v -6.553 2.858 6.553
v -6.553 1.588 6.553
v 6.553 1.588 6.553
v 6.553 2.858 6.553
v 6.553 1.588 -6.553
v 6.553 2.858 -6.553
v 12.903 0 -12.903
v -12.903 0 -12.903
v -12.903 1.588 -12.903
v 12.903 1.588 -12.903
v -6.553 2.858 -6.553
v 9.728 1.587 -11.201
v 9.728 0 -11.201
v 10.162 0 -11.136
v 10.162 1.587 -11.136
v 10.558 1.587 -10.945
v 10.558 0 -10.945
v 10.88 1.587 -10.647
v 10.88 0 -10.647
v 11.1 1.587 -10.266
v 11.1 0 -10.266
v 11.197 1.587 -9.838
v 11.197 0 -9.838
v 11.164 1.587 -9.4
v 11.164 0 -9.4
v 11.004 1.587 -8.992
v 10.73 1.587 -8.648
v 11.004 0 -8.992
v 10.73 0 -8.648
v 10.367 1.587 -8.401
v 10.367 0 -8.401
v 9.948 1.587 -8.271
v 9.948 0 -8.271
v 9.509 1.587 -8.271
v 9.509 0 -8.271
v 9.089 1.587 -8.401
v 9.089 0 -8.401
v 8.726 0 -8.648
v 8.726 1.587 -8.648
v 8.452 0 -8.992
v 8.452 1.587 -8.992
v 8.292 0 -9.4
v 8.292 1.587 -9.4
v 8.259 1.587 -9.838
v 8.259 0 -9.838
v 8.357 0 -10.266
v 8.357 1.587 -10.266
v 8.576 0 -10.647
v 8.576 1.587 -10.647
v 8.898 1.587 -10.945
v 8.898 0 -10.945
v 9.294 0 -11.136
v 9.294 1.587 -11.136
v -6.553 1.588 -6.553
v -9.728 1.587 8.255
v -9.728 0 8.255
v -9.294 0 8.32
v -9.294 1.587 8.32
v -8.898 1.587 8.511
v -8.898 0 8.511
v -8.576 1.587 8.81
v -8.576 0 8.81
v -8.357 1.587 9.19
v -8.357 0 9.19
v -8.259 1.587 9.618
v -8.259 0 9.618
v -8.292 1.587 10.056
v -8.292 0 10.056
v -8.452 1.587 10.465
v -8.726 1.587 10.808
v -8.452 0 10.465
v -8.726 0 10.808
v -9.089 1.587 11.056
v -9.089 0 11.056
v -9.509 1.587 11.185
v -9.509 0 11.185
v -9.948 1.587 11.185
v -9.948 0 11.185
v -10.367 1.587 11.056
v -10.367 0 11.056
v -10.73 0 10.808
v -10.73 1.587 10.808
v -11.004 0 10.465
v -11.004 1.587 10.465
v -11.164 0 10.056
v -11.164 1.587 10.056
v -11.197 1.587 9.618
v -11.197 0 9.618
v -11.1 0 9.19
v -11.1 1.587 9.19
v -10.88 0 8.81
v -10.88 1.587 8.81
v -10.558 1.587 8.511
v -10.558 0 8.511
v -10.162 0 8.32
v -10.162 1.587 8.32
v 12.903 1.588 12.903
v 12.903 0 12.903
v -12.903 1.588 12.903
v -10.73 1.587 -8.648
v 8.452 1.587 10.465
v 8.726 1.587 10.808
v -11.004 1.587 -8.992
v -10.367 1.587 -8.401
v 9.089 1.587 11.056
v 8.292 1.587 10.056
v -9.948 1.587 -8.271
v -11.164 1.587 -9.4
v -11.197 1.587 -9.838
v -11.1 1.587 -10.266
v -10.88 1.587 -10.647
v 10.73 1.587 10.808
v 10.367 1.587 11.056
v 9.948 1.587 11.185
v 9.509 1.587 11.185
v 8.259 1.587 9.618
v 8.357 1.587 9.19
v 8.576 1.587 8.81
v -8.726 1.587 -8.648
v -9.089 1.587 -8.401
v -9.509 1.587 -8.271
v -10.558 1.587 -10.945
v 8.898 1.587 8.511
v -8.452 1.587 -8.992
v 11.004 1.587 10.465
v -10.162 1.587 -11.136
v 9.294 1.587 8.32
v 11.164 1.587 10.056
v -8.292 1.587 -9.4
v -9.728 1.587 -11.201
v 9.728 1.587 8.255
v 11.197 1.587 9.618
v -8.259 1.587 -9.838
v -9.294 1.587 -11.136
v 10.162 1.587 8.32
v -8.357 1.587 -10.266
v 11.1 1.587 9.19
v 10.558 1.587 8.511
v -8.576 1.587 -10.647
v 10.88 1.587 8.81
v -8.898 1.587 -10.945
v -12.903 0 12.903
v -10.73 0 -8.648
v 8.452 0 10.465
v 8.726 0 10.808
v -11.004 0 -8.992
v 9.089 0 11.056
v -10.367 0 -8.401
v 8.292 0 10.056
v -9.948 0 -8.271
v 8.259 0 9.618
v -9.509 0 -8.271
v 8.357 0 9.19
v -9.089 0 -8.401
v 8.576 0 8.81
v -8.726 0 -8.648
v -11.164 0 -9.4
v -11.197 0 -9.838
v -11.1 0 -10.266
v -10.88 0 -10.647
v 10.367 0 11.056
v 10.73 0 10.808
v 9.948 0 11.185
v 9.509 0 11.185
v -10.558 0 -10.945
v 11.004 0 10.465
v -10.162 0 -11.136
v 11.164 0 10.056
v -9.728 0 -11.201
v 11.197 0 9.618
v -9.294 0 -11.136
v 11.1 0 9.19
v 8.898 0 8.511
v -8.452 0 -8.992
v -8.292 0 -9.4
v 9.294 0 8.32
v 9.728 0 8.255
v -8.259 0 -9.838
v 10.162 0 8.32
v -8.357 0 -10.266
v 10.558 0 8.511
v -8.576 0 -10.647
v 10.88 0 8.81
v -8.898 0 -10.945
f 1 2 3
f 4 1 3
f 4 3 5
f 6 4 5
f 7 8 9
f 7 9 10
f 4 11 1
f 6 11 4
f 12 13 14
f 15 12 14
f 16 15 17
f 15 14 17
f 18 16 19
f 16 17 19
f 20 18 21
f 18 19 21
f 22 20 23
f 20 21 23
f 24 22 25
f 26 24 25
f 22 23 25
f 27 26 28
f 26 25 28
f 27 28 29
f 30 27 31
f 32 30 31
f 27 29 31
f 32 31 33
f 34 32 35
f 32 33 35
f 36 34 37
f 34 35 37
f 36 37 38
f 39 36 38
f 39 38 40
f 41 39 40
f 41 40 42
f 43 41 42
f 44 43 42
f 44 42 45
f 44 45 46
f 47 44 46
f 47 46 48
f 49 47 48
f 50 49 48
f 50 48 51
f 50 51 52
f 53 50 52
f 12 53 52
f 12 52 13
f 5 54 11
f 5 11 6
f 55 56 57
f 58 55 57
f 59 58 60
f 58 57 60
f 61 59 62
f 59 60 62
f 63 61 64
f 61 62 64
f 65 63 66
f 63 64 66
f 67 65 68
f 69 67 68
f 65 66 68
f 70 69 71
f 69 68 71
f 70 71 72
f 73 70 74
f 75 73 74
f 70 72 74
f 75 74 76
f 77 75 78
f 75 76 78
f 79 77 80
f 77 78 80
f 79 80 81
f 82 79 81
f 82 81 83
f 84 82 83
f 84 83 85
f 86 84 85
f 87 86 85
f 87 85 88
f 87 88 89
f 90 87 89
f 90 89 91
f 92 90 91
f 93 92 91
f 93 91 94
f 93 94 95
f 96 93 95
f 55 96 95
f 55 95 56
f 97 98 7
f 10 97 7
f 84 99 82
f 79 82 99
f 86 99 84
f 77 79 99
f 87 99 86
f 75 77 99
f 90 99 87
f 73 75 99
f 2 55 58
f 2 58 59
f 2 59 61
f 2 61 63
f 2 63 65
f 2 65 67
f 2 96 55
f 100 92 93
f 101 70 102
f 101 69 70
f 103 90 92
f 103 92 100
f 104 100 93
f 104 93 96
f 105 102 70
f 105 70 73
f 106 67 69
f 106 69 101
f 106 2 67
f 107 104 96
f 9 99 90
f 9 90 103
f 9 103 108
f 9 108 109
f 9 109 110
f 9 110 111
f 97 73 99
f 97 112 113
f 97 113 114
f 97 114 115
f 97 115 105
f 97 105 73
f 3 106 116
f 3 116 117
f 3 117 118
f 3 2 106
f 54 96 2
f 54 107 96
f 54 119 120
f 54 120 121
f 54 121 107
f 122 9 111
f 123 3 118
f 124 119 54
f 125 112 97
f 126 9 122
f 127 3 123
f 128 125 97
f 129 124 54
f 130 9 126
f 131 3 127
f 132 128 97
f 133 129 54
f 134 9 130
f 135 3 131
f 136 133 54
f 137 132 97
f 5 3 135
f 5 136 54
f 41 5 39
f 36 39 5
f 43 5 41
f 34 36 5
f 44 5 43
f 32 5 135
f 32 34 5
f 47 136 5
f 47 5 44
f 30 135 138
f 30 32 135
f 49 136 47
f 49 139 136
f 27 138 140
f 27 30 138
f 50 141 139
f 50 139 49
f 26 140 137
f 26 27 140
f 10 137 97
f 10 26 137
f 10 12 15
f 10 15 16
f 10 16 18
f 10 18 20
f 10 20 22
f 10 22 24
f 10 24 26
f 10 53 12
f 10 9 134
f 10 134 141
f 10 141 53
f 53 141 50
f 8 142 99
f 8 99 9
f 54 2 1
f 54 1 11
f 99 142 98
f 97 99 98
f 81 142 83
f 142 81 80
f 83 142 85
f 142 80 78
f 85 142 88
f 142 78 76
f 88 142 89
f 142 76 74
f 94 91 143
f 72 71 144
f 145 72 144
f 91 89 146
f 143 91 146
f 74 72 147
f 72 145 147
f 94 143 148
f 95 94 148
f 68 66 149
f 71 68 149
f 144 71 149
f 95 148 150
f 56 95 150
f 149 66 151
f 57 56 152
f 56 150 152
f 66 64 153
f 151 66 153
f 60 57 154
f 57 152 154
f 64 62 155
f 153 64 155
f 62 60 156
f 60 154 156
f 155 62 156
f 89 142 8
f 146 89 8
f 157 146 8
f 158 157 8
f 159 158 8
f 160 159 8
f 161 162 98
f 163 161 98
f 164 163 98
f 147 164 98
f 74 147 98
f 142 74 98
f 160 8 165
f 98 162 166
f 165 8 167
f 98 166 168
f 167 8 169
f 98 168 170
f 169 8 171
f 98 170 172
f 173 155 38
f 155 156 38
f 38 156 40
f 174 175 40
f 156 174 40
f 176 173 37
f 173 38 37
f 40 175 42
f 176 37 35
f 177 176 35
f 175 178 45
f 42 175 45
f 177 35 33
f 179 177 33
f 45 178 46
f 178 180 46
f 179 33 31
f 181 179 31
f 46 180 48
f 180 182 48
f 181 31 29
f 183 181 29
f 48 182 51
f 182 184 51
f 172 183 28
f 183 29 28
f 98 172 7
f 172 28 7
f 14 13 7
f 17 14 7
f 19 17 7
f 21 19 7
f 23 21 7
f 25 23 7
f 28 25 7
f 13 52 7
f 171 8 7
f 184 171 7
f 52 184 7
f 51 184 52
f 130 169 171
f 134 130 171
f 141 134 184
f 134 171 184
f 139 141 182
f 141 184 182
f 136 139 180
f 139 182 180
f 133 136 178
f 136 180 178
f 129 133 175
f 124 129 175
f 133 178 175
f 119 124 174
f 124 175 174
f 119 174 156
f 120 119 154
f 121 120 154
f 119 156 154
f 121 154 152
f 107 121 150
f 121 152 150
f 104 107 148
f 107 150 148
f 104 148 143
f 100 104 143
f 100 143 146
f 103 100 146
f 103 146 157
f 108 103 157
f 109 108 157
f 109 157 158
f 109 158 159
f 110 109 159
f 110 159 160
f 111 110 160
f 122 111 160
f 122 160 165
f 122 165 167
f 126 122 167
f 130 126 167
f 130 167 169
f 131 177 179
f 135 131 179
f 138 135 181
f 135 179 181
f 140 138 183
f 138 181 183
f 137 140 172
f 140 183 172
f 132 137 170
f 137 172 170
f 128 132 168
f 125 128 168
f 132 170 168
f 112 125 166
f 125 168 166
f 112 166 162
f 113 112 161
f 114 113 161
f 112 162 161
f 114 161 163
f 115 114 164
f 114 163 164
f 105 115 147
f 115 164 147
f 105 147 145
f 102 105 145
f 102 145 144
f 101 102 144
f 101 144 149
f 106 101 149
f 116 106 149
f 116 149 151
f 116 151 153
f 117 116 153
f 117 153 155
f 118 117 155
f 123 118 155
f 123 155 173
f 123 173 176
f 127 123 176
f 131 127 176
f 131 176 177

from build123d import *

# Parameters (mm, degrees)
SKETCH1_W                   = 25.8064
SKETCH1_H                   = 25.8064
BOSS_EXTRUDE1_DEPTH         = 1.5875
SKETCH2_W                   = 13.1064
SKETCH2_H                   = 13.1064
BOSS_EXTRUDE2_DEPTH         = 1.27
F_32_0_116_DIAMETER_HOLE1_D = 2.9464


with BuildPart() as part:
    # Sketch1 → Boss-Extrude1 (new body)
    with BuildSketch(Plane(origin=(0, 0, 0), x_dir=(1, 0, 0), z_dir=(0, 1, 0))):
        Rectangle(SKETCH1_W, SKETCH1_H)
    extrude(amount=BOSS_EXTRUDE1_DEPTH)

    # Sketch2 → Boss-Extrude2 (add)
    with BuildSketch(Plane(origin=(0, 1.5875, 0), x_dir=(1, 0, 0), z_dir=(0, 1, 0))):
        Rectangle(SKETCH2_W, SKETCH2_H)
    extrude(amount=BOSS_EXTRUDE2_DEPTH)

    # #32 (0.116) Diameter Hole1 (through all)
    with Locations(Plane(origin=(-9.7282, 1.5875, -9.7282), x_dir=(0, 0, 1), z_dir=(0, 1, 0))):
        with Locations((0, 0), (19.4564, 0), (19.4564, 19.4564), (0, 19.4564)):
            Hole(F_32_0_116_DIAMETER_HOLE1_D / 2)


solid = part.part
